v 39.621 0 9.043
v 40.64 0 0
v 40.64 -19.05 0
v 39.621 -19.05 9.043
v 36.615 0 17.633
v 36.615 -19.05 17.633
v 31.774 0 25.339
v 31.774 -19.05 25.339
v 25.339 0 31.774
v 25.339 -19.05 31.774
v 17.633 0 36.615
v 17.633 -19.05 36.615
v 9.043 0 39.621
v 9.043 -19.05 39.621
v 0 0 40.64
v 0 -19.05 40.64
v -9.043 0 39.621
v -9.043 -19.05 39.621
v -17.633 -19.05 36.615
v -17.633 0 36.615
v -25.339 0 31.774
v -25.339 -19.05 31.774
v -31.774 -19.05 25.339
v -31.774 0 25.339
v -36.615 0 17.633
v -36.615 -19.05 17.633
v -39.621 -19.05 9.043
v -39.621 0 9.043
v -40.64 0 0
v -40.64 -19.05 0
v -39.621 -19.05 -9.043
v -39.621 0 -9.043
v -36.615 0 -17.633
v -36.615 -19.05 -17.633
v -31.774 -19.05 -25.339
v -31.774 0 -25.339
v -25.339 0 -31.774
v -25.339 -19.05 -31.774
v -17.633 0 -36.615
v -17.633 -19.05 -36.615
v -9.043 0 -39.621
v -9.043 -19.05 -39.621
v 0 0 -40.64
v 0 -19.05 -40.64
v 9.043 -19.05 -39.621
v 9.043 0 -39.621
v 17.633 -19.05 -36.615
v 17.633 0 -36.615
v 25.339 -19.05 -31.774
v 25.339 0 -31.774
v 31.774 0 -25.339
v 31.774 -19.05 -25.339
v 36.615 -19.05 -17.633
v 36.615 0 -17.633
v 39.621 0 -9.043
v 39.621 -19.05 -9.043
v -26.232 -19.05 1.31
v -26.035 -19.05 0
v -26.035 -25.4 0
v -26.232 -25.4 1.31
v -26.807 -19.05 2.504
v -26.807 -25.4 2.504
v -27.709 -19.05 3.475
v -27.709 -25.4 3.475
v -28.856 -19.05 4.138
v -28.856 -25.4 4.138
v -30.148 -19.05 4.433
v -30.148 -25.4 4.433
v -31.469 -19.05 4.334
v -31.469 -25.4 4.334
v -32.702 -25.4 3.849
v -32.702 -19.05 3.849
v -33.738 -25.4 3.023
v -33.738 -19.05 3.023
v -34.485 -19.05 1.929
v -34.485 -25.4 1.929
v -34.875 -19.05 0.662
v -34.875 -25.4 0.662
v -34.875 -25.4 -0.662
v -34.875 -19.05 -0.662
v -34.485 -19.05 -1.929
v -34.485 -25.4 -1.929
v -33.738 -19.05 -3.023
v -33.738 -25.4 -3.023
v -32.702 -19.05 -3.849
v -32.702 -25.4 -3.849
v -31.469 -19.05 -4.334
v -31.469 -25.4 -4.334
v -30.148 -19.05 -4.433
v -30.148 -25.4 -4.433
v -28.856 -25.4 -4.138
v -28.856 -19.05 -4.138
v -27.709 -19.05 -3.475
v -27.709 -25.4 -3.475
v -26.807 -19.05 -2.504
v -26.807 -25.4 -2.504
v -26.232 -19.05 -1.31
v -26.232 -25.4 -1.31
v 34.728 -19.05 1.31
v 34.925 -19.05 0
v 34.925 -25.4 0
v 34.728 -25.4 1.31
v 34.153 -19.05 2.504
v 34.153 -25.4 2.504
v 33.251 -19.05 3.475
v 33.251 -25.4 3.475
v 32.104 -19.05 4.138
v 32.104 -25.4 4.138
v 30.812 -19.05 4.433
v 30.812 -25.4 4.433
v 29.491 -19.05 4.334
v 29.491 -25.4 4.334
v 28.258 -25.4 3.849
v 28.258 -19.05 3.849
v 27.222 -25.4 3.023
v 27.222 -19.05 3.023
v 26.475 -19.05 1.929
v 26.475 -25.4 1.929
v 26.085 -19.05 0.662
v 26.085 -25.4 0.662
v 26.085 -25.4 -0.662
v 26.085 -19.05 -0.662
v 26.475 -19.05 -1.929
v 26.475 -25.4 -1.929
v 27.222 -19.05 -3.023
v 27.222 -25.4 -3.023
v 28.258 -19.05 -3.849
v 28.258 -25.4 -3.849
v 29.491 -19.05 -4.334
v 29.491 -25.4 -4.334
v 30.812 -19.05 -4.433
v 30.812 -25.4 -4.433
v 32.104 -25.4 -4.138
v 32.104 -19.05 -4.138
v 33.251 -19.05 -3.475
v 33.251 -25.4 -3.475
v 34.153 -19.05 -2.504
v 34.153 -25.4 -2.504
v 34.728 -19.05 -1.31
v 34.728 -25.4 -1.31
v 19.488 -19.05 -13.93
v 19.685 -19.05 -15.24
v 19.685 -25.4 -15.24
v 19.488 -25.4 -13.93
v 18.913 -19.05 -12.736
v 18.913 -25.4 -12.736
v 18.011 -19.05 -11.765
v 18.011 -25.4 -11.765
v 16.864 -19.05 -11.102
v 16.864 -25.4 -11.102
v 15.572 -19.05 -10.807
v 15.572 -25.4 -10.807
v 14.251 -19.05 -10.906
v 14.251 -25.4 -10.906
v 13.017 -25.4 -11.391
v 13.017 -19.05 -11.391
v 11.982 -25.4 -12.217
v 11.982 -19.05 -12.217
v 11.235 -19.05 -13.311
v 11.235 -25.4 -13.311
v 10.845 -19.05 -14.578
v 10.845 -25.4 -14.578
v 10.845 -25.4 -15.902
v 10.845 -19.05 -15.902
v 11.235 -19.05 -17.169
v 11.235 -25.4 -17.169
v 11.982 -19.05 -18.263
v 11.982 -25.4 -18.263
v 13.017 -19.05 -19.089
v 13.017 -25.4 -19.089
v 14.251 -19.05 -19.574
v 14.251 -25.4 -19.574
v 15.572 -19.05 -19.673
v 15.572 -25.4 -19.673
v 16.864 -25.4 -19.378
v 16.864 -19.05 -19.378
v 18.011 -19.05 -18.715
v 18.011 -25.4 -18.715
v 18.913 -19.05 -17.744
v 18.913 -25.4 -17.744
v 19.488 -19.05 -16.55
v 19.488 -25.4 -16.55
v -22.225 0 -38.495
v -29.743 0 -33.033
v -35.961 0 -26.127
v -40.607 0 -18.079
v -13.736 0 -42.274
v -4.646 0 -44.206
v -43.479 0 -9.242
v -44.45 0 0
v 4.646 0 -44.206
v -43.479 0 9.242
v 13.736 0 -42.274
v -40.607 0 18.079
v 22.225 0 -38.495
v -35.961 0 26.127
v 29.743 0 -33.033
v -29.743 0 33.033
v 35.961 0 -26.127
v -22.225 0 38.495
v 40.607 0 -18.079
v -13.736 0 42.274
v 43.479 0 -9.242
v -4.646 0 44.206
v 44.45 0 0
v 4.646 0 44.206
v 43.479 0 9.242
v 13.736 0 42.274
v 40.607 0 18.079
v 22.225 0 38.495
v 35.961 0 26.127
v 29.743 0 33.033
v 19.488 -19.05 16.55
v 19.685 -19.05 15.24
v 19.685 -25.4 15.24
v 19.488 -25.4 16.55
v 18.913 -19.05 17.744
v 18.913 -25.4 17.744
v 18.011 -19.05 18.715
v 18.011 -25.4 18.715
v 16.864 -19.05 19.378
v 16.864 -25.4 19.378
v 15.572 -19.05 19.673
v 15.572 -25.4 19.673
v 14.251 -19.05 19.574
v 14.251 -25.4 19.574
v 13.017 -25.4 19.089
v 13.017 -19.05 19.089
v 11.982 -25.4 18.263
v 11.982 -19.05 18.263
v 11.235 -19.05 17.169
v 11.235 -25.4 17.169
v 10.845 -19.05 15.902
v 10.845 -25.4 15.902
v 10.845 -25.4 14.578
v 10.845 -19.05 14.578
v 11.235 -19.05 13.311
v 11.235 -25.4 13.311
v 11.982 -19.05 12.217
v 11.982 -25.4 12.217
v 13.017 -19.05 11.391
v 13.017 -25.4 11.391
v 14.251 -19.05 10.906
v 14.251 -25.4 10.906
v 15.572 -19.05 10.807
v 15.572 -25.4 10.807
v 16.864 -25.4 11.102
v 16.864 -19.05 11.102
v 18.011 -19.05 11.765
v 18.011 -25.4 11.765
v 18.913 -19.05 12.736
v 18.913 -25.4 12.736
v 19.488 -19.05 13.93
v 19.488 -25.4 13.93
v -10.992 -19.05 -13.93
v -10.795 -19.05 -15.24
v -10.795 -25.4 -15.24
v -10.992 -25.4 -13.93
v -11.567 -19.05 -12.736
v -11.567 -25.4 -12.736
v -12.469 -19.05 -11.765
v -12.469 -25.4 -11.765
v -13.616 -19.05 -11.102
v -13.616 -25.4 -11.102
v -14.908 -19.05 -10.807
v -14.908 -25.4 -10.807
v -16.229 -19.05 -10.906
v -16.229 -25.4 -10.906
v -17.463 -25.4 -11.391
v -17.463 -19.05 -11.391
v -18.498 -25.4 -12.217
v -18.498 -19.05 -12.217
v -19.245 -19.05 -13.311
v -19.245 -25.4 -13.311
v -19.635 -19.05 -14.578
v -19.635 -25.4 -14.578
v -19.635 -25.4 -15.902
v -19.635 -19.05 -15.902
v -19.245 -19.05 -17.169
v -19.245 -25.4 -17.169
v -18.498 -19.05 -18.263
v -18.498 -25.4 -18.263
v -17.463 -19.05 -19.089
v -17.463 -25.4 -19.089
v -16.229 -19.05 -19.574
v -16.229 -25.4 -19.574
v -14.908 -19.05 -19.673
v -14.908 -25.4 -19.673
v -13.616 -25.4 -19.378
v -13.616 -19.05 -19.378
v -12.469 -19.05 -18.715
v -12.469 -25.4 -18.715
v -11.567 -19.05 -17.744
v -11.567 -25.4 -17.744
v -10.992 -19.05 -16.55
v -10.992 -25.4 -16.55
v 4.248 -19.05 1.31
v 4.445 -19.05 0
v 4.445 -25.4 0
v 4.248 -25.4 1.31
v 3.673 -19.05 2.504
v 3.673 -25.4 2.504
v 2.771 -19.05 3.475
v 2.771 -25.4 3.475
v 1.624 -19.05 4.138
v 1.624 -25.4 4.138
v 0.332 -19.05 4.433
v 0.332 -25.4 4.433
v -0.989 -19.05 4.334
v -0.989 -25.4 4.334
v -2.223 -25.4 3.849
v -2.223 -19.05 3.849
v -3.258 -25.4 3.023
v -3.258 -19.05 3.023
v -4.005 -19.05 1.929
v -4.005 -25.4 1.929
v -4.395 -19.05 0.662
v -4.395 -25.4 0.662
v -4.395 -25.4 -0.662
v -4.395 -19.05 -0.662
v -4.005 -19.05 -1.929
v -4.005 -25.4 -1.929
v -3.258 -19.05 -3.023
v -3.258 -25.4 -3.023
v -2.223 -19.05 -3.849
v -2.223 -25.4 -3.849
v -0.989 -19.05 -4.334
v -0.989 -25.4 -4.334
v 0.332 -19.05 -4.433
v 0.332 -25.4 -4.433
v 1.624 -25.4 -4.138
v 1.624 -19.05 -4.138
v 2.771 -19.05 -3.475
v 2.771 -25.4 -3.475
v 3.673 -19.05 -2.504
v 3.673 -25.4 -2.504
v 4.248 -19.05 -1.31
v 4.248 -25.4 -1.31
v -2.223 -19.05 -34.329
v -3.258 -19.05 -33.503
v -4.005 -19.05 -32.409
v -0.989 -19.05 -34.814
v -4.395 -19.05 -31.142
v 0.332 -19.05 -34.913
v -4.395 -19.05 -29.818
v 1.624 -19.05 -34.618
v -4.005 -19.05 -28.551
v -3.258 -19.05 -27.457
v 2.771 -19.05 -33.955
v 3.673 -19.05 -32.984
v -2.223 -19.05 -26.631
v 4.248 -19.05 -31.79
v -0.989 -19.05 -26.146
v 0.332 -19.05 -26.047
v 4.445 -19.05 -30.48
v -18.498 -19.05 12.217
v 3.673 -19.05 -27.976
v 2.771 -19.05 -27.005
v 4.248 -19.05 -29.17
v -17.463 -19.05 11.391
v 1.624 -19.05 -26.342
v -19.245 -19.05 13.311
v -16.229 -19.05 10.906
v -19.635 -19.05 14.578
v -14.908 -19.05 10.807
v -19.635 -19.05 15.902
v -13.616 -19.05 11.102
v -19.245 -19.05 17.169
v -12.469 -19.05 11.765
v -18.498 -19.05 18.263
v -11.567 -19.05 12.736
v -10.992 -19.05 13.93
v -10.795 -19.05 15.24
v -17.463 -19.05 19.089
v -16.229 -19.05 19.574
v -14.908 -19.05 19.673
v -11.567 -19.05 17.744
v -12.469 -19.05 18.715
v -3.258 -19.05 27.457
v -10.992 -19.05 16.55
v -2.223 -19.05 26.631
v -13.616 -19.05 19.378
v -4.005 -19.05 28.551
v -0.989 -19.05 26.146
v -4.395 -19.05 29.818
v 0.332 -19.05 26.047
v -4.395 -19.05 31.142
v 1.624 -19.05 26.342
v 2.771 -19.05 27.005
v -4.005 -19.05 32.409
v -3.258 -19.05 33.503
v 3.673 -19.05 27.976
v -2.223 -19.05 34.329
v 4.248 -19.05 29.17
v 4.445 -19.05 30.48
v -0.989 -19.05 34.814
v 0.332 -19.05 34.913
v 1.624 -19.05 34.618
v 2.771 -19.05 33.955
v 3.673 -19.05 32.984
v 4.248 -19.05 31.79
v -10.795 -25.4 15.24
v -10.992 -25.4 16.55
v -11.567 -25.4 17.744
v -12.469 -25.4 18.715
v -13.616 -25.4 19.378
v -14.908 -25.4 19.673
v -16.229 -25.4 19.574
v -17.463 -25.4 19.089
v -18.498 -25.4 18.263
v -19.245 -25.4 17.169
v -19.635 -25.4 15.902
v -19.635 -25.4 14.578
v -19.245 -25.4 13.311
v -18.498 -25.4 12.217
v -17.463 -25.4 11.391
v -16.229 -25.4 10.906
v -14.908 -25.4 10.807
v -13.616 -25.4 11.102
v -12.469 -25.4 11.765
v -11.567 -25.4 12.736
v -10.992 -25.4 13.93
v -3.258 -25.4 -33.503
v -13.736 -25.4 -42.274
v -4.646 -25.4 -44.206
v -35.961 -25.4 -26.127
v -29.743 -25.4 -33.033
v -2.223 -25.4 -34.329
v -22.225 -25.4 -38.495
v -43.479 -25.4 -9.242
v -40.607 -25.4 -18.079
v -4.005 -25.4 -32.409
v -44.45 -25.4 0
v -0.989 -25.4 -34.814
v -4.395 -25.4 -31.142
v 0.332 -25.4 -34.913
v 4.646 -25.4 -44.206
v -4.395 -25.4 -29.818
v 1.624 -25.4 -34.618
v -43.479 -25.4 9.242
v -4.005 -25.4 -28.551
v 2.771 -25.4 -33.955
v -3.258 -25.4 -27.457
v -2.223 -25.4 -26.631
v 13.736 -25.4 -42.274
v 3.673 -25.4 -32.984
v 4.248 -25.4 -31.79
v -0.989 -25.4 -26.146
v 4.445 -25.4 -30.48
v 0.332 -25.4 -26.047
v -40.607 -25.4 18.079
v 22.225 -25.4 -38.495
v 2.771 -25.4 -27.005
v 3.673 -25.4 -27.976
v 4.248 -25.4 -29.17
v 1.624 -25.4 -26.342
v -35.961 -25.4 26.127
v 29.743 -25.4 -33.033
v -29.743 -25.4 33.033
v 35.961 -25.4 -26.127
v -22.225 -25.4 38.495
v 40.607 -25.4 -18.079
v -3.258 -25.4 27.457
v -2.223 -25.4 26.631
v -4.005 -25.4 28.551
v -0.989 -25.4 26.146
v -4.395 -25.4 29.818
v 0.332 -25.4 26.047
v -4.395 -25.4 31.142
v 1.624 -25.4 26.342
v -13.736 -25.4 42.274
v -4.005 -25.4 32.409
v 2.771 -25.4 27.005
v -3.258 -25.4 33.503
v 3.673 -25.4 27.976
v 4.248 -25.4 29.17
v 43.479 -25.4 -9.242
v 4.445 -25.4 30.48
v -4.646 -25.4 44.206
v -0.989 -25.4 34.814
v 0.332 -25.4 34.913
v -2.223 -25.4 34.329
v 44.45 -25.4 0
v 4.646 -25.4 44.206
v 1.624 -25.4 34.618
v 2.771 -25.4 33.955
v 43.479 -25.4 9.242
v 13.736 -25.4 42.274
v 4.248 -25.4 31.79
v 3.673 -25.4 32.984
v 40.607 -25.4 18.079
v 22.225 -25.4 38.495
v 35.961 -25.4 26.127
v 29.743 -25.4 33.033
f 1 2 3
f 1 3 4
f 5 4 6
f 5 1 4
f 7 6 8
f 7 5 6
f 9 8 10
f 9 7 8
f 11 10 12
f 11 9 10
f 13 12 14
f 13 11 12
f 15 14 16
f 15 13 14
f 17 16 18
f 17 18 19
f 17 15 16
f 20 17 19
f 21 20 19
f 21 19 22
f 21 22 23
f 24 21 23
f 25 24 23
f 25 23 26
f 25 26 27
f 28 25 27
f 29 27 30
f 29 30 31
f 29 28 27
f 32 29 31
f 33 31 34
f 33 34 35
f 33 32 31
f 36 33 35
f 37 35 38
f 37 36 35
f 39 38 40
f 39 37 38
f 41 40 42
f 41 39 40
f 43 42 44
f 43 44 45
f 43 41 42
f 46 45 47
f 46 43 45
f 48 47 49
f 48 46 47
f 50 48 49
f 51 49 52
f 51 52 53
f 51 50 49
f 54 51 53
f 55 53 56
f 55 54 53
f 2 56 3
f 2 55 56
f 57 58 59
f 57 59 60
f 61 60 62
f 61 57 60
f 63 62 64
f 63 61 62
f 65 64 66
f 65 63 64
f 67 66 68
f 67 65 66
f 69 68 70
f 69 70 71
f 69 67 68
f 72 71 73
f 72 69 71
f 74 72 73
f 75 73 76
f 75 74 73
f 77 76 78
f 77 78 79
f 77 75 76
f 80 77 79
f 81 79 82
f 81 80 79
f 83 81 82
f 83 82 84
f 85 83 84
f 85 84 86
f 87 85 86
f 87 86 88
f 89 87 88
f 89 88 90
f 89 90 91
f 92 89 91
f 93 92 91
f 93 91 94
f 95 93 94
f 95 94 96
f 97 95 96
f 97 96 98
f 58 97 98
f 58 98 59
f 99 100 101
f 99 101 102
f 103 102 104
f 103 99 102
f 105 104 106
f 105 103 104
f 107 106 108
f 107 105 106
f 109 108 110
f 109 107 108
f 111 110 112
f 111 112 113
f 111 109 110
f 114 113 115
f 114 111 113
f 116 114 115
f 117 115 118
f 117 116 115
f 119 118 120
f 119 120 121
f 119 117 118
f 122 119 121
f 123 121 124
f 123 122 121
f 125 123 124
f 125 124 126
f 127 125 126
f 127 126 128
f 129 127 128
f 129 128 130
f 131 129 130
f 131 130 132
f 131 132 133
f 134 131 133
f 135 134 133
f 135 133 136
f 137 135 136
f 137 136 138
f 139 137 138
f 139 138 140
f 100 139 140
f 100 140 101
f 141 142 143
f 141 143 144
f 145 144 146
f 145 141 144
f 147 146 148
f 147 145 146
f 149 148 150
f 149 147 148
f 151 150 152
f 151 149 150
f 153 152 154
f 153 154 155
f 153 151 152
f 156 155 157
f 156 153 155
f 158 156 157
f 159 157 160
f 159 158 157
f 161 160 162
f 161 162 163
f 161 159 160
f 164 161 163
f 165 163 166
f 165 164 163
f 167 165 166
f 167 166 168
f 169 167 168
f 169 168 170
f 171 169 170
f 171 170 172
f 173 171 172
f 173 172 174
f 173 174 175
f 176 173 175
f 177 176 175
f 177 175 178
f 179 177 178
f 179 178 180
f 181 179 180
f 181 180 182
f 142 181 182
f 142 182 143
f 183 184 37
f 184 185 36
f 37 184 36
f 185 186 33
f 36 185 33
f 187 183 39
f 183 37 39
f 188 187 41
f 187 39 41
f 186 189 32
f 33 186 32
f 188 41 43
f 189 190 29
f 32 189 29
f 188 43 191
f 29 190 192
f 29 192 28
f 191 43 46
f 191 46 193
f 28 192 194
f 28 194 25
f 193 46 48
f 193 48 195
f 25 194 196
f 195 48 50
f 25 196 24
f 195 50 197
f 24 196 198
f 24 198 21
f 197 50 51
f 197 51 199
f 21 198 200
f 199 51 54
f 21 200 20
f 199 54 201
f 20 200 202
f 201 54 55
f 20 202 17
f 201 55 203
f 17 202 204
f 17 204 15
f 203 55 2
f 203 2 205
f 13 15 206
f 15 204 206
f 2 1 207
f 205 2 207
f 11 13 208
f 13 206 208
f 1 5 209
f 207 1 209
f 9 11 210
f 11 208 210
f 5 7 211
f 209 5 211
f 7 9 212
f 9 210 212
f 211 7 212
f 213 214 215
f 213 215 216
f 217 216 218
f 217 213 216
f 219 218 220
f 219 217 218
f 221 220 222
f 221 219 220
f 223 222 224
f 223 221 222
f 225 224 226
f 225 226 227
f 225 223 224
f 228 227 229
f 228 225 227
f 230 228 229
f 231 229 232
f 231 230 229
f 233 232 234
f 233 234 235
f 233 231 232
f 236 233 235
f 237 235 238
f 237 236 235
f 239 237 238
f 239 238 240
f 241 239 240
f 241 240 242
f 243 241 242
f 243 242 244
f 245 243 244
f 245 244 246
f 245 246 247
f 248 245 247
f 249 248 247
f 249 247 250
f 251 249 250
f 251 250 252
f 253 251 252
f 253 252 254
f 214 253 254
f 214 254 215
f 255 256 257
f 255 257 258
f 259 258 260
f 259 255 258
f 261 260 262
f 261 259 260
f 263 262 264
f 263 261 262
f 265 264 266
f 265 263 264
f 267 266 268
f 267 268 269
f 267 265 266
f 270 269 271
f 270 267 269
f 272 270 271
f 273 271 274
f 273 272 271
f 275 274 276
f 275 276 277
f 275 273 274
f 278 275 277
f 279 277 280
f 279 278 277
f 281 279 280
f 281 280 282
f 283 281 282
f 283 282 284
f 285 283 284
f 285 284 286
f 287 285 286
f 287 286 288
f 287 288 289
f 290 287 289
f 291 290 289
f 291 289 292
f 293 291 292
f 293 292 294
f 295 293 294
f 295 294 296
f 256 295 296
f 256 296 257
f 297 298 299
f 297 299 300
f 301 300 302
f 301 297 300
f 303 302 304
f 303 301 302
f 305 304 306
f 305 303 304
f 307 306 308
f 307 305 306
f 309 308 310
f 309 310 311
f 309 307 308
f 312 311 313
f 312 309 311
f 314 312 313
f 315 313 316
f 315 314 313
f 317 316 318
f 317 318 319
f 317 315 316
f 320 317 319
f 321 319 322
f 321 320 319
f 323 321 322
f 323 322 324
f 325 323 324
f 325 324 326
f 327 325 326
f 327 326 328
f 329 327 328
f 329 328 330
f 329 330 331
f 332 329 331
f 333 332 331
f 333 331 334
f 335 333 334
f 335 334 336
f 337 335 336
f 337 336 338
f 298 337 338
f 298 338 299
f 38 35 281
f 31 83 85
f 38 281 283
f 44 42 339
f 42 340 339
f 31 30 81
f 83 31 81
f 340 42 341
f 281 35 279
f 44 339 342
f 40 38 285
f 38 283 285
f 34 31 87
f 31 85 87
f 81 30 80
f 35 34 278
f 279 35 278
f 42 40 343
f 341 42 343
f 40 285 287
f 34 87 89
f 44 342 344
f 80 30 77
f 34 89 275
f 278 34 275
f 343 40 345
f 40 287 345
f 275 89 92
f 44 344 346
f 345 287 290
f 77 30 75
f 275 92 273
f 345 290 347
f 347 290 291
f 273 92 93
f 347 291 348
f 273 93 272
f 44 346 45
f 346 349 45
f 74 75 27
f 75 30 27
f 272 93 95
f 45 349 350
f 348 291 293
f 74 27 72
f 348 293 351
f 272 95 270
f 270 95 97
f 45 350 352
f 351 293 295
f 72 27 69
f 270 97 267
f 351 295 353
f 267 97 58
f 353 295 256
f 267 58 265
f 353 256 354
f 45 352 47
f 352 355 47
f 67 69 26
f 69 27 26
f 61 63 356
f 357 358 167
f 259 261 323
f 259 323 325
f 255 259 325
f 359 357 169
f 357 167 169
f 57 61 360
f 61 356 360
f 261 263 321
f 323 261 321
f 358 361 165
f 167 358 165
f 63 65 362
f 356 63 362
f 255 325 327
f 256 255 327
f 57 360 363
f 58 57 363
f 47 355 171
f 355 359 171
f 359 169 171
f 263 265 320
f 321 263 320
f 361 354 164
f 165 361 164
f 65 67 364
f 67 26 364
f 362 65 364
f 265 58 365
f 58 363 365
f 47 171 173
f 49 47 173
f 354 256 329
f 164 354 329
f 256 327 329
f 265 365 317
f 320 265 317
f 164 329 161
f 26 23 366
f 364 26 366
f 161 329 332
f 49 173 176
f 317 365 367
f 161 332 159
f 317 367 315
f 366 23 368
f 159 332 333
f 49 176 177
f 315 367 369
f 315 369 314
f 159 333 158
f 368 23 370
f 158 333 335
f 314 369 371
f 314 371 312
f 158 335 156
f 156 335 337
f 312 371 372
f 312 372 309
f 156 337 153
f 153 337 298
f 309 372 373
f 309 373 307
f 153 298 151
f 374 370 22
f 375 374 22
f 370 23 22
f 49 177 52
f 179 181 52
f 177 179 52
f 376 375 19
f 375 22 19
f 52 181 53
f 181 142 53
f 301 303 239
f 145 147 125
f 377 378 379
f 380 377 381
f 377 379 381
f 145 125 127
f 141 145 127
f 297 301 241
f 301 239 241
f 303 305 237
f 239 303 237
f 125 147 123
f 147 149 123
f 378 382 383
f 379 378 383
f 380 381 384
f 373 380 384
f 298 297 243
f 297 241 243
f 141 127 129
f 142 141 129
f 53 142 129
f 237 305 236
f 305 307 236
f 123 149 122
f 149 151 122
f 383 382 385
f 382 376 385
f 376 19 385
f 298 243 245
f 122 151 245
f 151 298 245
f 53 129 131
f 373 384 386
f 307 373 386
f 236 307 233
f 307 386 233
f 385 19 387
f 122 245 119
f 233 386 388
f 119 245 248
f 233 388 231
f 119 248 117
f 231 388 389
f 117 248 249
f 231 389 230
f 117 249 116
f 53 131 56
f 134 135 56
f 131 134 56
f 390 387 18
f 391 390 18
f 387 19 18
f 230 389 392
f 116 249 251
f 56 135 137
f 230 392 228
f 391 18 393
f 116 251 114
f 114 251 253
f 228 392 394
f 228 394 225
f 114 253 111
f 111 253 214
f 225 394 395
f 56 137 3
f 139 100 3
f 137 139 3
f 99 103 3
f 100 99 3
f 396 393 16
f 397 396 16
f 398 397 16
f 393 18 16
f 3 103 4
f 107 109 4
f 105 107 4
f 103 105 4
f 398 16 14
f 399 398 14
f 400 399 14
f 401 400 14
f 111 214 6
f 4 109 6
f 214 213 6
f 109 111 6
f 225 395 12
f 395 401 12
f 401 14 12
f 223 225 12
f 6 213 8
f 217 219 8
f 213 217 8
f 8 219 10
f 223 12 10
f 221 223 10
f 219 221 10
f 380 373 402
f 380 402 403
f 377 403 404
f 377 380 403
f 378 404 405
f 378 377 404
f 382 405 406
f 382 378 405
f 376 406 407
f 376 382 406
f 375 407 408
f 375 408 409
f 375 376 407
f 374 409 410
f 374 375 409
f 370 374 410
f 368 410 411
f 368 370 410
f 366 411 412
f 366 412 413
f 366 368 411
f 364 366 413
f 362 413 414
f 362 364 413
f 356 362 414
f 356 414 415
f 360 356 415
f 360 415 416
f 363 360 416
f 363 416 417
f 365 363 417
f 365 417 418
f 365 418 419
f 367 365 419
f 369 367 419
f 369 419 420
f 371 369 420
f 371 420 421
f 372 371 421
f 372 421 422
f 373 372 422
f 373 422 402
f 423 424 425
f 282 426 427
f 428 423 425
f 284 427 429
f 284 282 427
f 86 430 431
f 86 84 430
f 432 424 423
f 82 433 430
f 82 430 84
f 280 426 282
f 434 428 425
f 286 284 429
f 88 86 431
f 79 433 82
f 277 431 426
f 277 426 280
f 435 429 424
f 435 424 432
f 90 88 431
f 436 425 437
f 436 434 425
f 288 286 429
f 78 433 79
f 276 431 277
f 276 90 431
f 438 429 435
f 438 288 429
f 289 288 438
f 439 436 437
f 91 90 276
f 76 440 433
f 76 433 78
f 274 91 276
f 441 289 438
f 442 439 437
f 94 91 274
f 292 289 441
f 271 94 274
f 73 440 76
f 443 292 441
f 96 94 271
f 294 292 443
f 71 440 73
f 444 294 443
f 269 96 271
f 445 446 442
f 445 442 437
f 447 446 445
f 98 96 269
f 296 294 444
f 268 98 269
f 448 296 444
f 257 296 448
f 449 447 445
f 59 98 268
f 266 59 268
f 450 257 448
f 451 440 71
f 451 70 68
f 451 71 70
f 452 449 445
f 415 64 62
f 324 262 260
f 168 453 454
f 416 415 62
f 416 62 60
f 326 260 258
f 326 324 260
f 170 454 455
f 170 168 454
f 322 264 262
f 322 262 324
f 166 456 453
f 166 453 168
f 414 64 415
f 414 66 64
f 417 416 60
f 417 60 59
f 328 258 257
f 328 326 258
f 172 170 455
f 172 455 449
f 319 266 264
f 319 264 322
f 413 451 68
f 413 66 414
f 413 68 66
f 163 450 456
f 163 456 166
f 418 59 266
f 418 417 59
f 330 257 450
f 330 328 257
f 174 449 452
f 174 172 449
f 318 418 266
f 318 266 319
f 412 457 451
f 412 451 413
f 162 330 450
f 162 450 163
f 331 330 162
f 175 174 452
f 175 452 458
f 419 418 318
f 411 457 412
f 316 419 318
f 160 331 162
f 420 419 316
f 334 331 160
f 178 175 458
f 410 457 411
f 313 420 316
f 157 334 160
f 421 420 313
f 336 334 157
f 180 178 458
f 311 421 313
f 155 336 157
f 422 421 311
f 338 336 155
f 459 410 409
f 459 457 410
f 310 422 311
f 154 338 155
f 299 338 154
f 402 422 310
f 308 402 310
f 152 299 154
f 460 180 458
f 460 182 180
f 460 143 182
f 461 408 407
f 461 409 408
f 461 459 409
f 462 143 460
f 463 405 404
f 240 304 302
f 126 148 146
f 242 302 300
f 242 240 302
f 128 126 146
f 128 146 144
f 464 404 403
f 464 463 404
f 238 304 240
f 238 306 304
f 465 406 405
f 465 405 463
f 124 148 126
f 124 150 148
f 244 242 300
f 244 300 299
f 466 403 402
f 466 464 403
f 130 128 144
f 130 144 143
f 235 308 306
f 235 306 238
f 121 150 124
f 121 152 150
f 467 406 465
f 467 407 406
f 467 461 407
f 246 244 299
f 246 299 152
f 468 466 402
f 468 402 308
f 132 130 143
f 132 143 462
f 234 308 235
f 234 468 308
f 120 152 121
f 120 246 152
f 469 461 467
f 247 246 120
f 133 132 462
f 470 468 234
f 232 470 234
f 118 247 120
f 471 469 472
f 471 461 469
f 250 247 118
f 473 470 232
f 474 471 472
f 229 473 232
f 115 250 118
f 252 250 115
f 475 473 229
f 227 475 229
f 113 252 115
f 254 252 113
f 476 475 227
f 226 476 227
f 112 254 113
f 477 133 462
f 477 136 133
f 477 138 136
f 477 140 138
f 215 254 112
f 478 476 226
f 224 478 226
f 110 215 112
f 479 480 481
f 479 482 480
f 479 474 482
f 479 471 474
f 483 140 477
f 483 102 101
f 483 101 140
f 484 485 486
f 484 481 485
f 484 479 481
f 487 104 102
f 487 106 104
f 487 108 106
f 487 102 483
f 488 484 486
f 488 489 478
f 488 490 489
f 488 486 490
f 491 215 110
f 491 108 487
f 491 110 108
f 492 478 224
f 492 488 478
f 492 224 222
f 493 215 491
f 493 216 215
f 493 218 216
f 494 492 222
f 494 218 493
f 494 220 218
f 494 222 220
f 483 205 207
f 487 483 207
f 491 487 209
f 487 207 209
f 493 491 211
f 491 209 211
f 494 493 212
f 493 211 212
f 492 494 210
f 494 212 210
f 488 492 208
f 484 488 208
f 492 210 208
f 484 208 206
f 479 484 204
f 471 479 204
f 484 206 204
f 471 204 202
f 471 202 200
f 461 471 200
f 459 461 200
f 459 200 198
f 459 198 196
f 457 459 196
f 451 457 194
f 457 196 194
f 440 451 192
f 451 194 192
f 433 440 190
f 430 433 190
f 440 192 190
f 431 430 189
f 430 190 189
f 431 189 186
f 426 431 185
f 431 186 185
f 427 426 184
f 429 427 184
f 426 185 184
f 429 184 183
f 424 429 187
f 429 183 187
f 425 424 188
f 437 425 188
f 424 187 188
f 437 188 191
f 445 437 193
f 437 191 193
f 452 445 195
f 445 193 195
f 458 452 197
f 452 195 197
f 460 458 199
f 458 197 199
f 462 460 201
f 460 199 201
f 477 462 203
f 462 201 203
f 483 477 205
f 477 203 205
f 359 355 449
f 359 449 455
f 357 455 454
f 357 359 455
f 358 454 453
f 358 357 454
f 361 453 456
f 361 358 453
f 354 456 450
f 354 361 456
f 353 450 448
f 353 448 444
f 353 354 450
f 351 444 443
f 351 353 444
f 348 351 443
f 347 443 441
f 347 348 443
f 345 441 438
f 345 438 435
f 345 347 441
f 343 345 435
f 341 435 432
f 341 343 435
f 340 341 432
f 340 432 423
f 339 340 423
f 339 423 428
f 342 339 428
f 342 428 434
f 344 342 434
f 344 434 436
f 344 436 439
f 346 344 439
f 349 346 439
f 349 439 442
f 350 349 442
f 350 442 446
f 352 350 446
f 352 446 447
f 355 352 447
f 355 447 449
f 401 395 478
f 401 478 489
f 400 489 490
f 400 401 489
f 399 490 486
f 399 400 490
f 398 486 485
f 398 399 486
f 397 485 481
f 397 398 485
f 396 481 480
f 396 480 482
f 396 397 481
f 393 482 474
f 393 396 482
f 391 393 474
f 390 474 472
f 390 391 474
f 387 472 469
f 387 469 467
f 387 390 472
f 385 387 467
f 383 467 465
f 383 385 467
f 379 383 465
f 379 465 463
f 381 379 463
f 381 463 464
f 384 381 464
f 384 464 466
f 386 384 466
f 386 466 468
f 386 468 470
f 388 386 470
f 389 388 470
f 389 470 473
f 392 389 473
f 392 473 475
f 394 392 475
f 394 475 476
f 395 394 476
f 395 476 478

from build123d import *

# Parameters (mm, degrees)
F0_R     = 44.45
F1_DEPTH = 25.4
F2_R     = 40.64
F3_DEPTH = 19.05
F4_R     = 4.445
F5_DEPTH = 25.4


with BuildPart() as f1:
    # F0 (on Front) → F1 (new body)
    with BuildSketch(Plane.XZ):
        Circle(F0_R)
    extrude(amount=F1_DEPTH)

    # F2 (on Front) → F3 (cut)
    with BuildSketch(Plane.XZ):
        Circle(F2_R)
    extrude(amount=F3_DEPTH, mode=Mode.SUBTRACT)

    # F4 (on Front) → F5 (cut)
    with BuildSketch(Plane.XZ):
        with Locations((0, 30.48)):
            Circle(F4_R)
        with Locations((-15.24, 15.24)):
            Circle(F4_R)
        with Locations((-30.48, 0)):
            Circle(F4_R)
        with Locations((15.24, 15.24)):
            Circle(F4_R)
        with Locations((30.48, 0)):
            Circle(F4_R)
        with Locations((-15.24, -15.24)):
            Circle(F4_R)
        with Locations((15.24, -15.24)):
            Circle(F4_R)
        with Locations((0, -30.48)):
            Circle(F4_R)
        Circle(F4_R)
    extrude(amount=F5_DEPTH, mode=Mode.SUBTRACT)


solid = f1.part
